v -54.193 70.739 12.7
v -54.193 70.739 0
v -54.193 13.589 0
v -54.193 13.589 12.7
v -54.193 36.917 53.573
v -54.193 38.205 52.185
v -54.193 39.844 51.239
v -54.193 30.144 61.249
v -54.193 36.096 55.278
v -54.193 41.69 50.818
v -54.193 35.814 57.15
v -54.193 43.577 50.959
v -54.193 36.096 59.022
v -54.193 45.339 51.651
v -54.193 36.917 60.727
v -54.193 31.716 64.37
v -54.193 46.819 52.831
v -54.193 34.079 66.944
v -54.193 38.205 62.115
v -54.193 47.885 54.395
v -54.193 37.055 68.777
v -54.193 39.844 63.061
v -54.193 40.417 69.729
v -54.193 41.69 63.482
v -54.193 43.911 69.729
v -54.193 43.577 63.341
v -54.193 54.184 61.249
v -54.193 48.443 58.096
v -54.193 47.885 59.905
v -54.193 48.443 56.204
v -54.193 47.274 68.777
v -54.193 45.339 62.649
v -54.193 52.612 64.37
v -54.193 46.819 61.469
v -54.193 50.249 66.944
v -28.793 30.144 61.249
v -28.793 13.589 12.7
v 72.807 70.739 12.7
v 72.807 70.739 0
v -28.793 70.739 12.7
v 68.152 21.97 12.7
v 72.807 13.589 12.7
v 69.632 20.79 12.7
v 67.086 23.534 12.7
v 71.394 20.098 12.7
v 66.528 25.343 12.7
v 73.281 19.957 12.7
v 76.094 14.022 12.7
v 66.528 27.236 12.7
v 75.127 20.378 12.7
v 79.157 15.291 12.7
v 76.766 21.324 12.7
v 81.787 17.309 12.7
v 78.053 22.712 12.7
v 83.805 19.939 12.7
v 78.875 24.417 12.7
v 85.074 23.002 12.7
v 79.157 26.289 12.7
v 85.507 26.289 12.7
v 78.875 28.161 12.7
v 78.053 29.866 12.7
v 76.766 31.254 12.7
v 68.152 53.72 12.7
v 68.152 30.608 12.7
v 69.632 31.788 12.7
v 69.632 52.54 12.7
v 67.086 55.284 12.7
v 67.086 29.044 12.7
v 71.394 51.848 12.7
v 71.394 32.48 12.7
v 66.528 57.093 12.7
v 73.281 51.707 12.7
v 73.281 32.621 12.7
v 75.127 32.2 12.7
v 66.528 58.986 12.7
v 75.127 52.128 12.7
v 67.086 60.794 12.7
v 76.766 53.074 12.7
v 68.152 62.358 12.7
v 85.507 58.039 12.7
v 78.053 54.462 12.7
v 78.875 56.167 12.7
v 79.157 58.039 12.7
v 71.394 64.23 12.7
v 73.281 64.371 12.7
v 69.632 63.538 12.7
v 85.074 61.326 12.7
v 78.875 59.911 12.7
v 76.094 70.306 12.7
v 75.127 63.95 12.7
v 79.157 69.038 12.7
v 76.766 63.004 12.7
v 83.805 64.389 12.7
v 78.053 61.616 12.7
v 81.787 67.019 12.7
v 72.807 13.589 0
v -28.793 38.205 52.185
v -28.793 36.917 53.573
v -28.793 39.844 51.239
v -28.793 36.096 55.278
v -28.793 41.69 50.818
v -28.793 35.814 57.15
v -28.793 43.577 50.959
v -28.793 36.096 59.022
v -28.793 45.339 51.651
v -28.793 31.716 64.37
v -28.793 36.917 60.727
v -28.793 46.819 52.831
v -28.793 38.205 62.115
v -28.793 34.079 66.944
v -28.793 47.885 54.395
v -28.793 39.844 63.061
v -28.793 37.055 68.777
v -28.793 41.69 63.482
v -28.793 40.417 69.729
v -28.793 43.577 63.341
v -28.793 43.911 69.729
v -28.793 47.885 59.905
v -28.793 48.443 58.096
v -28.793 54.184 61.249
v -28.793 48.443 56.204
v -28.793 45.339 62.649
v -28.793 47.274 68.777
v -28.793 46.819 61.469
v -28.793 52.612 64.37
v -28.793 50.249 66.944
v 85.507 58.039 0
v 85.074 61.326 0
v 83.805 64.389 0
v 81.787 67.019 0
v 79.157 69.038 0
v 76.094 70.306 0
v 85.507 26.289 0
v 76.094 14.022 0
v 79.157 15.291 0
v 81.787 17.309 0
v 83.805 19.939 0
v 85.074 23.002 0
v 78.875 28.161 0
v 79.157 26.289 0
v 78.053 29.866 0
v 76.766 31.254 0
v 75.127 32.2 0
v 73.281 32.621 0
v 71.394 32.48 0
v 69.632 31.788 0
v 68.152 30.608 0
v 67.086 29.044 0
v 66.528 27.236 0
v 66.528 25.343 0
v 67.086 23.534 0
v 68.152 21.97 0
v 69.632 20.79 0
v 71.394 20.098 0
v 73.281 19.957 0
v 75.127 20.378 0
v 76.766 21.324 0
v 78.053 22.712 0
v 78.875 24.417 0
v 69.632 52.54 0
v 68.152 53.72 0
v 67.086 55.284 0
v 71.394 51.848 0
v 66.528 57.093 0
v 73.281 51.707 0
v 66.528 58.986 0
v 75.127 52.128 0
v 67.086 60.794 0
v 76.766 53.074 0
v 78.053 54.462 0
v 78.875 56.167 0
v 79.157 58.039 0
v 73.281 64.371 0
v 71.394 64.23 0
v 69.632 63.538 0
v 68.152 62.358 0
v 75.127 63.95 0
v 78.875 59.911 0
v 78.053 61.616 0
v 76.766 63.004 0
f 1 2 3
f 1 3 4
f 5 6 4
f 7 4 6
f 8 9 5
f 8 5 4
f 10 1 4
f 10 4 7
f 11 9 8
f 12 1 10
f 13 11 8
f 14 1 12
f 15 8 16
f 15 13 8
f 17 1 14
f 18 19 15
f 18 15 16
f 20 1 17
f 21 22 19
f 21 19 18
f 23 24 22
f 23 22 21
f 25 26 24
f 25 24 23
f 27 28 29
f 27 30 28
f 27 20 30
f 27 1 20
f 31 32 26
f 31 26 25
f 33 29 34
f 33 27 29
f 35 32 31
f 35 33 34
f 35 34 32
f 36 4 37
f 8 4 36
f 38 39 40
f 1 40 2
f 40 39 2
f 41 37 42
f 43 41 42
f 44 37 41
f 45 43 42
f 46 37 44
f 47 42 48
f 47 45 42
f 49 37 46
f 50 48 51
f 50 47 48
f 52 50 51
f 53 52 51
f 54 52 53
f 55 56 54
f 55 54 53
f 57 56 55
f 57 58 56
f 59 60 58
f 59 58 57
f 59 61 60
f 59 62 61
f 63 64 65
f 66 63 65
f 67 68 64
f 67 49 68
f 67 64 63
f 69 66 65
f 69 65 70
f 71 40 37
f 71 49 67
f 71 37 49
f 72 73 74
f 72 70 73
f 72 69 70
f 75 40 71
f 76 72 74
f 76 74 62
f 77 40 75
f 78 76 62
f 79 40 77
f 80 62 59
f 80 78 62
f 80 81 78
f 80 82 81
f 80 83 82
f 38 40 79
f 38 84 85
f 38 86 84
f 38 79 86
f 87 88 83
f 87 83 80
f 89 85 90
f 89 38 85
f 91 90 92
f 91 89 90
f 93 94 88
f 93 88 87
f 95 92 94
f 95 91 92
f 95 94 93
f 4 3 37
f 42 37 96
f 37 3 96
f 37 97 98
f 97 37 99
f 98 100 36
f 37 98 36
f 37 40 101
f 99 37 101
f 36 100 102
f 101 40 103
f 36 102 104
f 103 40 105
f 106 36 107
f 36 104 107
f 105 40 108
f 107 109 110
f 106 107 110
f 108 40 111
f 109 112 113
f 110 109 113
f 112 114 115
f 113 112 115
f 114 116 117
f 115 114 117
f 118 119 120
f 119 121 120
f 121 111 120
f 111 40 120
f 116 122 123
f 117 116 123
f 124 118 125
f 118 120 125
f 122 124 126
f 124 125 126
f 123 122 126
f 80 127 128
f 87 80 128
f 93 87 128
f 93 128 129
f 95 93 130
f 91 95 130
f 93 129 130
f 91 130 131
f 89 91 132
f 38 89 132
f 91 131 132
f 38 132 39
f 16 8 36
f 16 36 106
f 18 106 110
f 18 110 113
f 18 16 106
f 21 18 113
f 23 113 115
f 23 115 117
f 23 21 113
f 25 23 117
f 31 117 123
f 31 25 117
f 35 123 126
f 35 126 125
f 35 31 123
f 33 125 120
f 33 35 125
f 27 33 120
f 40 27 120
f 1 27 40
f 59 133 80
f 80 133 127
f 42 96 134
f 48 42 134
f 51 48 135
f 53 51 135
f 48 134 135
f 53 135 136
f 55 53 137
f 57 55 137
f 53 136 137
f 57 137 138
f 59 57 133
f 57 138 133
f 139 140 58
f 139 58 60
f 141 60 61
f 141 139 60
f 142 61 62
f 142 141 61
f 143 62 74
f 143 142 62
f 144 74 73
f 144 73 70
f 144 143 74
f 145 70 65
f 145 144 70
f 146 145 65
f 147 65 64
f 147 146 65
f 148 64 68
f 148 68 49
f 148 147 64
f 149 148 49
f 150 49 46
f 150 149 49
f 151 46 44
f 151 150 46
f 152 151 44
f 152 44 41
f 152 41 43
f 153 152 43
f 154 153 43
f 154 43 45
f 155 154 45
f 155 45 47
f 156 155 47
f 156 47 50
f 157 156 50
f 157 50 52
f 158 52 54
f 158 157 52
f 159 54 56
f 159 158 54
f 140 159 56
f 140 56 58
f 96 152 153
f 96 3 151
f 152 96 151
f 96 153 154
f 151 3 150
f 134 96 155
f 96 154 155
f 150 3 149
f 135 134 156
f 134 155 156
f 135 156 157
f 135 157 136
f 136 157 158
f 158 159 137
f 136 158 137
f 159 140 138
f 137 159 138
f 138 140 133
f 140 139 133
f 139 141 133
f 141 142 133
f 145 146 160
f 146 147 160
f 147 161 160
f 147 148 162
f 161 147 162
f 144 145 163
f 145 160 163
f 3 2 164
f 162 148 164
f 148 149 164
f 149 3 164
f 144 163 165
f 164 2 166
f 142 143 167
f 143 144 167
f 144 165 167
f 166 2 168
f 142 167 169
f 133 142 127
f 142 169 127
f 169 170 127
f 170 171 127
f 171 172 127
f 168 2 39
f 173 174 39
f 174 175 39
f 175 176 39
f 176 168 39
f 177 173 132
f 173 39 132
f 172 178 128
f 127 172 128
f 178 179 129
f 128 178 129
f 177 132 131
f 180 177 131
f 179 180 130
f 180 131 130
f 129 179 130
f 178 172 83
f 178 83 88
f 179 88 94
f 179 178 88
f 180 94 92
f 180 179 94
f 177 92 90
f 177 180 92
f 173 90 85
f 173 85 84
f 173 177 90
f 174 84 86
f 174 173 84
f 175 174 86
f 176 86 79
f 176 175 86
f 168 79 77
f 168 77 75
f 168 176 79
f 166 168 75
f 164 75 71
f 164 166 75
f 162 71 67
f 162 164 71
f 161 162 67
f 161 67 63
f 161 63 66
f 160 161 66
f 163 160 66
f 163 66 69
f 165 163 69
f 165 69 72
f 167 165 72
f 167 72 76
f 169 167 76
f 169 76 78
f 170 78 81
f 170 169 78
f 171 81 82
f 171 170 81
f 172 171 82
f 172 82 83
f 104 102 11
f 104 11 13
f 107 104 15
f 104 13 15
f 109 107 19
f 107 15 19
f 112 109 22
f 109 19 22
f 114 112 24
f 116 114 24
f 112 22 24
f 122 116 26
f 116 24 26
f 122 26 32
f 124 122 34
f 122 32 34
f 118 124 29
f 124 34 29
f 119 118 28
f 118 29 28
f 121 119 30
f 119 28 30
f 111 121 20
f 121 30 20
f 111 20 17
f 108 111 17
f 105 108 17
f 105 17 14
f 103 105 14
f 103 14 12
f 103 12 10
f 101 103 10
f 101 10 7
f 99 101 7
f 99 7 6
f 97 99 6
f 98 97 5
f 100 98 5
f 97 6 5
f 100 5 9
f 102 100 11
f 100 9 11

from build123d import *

# Parameters (mm, degrees)
SKETCH1_R           = 6.35
BOSS_EXTRUDE2_DEPTH = 12.7
SKETCH2_R           = 6.35
BOSS_EXTRUDE3_DEPTH = 25.4


with BuildPart() as part:
    # Sketch1 → Boss-Extrude2 (new body)
    with BuildSketch(Plane.XY):
        with BuildLine():
            Line((72.806693362, 70.739109347), (-54.193306638, 70.739109347))
            Line((-54.193306638, 70.739109347), (-54.193306638, 13.589109347))
            Line((-54.193306638, 13.589109347), (72.806693362, 13.589109347))
            ThreePointArc((72.806693362, 13.589109347), (81.786949483, 17.308853226), (85.506693362, 26.289109347))
            Line((85.506693362, 26.289109347), (85.506693362, 58.039109347))
            ThreePointArc((85.506693362, 58.039109347), (81.786949483, 67.019365468), (72.806693362, 70.739109347))
        make_face()
        with Locations((72.806693362, 58.039109347)):
            Circle(SKETCH1_R, mode=Mode.SUBTRACT)
        with Locations((72.806693362, 26.289109347)):
            Circle(SKETCH1_R, mode=Mode.SUBTRACT)
    extrude(amount=BOSS_EXTRUDE2_DEPTH)

    # Sketch2 → Boss-Extrude3 (add)
    with BuildSketch(Plane.ZY.offset(54.193306638)):
        with BuildLine():
            Line((12.7, 13.589109347), (61.248819539, 30.143723397))
            ThreePointArc((61.248819539, 30.143723397), (69.85, 42.164109347), (61.248819539, 54.184495297))
            Line((61.248819539, 54.184495297), (12.7, 70.739109347))
            Line((12.7, 70.739109347), (12.7, 13.589109347))
        make_face()
        with Locations(Location((57.15, 42.164109347, 0), (0, 0, 270))):
            Circle(SKETCH2_R, mode=Mode.SUBTRACT)
    extrude(amount=-BOSS_EXTRUDE3_DEPTH)


solid = part.part
